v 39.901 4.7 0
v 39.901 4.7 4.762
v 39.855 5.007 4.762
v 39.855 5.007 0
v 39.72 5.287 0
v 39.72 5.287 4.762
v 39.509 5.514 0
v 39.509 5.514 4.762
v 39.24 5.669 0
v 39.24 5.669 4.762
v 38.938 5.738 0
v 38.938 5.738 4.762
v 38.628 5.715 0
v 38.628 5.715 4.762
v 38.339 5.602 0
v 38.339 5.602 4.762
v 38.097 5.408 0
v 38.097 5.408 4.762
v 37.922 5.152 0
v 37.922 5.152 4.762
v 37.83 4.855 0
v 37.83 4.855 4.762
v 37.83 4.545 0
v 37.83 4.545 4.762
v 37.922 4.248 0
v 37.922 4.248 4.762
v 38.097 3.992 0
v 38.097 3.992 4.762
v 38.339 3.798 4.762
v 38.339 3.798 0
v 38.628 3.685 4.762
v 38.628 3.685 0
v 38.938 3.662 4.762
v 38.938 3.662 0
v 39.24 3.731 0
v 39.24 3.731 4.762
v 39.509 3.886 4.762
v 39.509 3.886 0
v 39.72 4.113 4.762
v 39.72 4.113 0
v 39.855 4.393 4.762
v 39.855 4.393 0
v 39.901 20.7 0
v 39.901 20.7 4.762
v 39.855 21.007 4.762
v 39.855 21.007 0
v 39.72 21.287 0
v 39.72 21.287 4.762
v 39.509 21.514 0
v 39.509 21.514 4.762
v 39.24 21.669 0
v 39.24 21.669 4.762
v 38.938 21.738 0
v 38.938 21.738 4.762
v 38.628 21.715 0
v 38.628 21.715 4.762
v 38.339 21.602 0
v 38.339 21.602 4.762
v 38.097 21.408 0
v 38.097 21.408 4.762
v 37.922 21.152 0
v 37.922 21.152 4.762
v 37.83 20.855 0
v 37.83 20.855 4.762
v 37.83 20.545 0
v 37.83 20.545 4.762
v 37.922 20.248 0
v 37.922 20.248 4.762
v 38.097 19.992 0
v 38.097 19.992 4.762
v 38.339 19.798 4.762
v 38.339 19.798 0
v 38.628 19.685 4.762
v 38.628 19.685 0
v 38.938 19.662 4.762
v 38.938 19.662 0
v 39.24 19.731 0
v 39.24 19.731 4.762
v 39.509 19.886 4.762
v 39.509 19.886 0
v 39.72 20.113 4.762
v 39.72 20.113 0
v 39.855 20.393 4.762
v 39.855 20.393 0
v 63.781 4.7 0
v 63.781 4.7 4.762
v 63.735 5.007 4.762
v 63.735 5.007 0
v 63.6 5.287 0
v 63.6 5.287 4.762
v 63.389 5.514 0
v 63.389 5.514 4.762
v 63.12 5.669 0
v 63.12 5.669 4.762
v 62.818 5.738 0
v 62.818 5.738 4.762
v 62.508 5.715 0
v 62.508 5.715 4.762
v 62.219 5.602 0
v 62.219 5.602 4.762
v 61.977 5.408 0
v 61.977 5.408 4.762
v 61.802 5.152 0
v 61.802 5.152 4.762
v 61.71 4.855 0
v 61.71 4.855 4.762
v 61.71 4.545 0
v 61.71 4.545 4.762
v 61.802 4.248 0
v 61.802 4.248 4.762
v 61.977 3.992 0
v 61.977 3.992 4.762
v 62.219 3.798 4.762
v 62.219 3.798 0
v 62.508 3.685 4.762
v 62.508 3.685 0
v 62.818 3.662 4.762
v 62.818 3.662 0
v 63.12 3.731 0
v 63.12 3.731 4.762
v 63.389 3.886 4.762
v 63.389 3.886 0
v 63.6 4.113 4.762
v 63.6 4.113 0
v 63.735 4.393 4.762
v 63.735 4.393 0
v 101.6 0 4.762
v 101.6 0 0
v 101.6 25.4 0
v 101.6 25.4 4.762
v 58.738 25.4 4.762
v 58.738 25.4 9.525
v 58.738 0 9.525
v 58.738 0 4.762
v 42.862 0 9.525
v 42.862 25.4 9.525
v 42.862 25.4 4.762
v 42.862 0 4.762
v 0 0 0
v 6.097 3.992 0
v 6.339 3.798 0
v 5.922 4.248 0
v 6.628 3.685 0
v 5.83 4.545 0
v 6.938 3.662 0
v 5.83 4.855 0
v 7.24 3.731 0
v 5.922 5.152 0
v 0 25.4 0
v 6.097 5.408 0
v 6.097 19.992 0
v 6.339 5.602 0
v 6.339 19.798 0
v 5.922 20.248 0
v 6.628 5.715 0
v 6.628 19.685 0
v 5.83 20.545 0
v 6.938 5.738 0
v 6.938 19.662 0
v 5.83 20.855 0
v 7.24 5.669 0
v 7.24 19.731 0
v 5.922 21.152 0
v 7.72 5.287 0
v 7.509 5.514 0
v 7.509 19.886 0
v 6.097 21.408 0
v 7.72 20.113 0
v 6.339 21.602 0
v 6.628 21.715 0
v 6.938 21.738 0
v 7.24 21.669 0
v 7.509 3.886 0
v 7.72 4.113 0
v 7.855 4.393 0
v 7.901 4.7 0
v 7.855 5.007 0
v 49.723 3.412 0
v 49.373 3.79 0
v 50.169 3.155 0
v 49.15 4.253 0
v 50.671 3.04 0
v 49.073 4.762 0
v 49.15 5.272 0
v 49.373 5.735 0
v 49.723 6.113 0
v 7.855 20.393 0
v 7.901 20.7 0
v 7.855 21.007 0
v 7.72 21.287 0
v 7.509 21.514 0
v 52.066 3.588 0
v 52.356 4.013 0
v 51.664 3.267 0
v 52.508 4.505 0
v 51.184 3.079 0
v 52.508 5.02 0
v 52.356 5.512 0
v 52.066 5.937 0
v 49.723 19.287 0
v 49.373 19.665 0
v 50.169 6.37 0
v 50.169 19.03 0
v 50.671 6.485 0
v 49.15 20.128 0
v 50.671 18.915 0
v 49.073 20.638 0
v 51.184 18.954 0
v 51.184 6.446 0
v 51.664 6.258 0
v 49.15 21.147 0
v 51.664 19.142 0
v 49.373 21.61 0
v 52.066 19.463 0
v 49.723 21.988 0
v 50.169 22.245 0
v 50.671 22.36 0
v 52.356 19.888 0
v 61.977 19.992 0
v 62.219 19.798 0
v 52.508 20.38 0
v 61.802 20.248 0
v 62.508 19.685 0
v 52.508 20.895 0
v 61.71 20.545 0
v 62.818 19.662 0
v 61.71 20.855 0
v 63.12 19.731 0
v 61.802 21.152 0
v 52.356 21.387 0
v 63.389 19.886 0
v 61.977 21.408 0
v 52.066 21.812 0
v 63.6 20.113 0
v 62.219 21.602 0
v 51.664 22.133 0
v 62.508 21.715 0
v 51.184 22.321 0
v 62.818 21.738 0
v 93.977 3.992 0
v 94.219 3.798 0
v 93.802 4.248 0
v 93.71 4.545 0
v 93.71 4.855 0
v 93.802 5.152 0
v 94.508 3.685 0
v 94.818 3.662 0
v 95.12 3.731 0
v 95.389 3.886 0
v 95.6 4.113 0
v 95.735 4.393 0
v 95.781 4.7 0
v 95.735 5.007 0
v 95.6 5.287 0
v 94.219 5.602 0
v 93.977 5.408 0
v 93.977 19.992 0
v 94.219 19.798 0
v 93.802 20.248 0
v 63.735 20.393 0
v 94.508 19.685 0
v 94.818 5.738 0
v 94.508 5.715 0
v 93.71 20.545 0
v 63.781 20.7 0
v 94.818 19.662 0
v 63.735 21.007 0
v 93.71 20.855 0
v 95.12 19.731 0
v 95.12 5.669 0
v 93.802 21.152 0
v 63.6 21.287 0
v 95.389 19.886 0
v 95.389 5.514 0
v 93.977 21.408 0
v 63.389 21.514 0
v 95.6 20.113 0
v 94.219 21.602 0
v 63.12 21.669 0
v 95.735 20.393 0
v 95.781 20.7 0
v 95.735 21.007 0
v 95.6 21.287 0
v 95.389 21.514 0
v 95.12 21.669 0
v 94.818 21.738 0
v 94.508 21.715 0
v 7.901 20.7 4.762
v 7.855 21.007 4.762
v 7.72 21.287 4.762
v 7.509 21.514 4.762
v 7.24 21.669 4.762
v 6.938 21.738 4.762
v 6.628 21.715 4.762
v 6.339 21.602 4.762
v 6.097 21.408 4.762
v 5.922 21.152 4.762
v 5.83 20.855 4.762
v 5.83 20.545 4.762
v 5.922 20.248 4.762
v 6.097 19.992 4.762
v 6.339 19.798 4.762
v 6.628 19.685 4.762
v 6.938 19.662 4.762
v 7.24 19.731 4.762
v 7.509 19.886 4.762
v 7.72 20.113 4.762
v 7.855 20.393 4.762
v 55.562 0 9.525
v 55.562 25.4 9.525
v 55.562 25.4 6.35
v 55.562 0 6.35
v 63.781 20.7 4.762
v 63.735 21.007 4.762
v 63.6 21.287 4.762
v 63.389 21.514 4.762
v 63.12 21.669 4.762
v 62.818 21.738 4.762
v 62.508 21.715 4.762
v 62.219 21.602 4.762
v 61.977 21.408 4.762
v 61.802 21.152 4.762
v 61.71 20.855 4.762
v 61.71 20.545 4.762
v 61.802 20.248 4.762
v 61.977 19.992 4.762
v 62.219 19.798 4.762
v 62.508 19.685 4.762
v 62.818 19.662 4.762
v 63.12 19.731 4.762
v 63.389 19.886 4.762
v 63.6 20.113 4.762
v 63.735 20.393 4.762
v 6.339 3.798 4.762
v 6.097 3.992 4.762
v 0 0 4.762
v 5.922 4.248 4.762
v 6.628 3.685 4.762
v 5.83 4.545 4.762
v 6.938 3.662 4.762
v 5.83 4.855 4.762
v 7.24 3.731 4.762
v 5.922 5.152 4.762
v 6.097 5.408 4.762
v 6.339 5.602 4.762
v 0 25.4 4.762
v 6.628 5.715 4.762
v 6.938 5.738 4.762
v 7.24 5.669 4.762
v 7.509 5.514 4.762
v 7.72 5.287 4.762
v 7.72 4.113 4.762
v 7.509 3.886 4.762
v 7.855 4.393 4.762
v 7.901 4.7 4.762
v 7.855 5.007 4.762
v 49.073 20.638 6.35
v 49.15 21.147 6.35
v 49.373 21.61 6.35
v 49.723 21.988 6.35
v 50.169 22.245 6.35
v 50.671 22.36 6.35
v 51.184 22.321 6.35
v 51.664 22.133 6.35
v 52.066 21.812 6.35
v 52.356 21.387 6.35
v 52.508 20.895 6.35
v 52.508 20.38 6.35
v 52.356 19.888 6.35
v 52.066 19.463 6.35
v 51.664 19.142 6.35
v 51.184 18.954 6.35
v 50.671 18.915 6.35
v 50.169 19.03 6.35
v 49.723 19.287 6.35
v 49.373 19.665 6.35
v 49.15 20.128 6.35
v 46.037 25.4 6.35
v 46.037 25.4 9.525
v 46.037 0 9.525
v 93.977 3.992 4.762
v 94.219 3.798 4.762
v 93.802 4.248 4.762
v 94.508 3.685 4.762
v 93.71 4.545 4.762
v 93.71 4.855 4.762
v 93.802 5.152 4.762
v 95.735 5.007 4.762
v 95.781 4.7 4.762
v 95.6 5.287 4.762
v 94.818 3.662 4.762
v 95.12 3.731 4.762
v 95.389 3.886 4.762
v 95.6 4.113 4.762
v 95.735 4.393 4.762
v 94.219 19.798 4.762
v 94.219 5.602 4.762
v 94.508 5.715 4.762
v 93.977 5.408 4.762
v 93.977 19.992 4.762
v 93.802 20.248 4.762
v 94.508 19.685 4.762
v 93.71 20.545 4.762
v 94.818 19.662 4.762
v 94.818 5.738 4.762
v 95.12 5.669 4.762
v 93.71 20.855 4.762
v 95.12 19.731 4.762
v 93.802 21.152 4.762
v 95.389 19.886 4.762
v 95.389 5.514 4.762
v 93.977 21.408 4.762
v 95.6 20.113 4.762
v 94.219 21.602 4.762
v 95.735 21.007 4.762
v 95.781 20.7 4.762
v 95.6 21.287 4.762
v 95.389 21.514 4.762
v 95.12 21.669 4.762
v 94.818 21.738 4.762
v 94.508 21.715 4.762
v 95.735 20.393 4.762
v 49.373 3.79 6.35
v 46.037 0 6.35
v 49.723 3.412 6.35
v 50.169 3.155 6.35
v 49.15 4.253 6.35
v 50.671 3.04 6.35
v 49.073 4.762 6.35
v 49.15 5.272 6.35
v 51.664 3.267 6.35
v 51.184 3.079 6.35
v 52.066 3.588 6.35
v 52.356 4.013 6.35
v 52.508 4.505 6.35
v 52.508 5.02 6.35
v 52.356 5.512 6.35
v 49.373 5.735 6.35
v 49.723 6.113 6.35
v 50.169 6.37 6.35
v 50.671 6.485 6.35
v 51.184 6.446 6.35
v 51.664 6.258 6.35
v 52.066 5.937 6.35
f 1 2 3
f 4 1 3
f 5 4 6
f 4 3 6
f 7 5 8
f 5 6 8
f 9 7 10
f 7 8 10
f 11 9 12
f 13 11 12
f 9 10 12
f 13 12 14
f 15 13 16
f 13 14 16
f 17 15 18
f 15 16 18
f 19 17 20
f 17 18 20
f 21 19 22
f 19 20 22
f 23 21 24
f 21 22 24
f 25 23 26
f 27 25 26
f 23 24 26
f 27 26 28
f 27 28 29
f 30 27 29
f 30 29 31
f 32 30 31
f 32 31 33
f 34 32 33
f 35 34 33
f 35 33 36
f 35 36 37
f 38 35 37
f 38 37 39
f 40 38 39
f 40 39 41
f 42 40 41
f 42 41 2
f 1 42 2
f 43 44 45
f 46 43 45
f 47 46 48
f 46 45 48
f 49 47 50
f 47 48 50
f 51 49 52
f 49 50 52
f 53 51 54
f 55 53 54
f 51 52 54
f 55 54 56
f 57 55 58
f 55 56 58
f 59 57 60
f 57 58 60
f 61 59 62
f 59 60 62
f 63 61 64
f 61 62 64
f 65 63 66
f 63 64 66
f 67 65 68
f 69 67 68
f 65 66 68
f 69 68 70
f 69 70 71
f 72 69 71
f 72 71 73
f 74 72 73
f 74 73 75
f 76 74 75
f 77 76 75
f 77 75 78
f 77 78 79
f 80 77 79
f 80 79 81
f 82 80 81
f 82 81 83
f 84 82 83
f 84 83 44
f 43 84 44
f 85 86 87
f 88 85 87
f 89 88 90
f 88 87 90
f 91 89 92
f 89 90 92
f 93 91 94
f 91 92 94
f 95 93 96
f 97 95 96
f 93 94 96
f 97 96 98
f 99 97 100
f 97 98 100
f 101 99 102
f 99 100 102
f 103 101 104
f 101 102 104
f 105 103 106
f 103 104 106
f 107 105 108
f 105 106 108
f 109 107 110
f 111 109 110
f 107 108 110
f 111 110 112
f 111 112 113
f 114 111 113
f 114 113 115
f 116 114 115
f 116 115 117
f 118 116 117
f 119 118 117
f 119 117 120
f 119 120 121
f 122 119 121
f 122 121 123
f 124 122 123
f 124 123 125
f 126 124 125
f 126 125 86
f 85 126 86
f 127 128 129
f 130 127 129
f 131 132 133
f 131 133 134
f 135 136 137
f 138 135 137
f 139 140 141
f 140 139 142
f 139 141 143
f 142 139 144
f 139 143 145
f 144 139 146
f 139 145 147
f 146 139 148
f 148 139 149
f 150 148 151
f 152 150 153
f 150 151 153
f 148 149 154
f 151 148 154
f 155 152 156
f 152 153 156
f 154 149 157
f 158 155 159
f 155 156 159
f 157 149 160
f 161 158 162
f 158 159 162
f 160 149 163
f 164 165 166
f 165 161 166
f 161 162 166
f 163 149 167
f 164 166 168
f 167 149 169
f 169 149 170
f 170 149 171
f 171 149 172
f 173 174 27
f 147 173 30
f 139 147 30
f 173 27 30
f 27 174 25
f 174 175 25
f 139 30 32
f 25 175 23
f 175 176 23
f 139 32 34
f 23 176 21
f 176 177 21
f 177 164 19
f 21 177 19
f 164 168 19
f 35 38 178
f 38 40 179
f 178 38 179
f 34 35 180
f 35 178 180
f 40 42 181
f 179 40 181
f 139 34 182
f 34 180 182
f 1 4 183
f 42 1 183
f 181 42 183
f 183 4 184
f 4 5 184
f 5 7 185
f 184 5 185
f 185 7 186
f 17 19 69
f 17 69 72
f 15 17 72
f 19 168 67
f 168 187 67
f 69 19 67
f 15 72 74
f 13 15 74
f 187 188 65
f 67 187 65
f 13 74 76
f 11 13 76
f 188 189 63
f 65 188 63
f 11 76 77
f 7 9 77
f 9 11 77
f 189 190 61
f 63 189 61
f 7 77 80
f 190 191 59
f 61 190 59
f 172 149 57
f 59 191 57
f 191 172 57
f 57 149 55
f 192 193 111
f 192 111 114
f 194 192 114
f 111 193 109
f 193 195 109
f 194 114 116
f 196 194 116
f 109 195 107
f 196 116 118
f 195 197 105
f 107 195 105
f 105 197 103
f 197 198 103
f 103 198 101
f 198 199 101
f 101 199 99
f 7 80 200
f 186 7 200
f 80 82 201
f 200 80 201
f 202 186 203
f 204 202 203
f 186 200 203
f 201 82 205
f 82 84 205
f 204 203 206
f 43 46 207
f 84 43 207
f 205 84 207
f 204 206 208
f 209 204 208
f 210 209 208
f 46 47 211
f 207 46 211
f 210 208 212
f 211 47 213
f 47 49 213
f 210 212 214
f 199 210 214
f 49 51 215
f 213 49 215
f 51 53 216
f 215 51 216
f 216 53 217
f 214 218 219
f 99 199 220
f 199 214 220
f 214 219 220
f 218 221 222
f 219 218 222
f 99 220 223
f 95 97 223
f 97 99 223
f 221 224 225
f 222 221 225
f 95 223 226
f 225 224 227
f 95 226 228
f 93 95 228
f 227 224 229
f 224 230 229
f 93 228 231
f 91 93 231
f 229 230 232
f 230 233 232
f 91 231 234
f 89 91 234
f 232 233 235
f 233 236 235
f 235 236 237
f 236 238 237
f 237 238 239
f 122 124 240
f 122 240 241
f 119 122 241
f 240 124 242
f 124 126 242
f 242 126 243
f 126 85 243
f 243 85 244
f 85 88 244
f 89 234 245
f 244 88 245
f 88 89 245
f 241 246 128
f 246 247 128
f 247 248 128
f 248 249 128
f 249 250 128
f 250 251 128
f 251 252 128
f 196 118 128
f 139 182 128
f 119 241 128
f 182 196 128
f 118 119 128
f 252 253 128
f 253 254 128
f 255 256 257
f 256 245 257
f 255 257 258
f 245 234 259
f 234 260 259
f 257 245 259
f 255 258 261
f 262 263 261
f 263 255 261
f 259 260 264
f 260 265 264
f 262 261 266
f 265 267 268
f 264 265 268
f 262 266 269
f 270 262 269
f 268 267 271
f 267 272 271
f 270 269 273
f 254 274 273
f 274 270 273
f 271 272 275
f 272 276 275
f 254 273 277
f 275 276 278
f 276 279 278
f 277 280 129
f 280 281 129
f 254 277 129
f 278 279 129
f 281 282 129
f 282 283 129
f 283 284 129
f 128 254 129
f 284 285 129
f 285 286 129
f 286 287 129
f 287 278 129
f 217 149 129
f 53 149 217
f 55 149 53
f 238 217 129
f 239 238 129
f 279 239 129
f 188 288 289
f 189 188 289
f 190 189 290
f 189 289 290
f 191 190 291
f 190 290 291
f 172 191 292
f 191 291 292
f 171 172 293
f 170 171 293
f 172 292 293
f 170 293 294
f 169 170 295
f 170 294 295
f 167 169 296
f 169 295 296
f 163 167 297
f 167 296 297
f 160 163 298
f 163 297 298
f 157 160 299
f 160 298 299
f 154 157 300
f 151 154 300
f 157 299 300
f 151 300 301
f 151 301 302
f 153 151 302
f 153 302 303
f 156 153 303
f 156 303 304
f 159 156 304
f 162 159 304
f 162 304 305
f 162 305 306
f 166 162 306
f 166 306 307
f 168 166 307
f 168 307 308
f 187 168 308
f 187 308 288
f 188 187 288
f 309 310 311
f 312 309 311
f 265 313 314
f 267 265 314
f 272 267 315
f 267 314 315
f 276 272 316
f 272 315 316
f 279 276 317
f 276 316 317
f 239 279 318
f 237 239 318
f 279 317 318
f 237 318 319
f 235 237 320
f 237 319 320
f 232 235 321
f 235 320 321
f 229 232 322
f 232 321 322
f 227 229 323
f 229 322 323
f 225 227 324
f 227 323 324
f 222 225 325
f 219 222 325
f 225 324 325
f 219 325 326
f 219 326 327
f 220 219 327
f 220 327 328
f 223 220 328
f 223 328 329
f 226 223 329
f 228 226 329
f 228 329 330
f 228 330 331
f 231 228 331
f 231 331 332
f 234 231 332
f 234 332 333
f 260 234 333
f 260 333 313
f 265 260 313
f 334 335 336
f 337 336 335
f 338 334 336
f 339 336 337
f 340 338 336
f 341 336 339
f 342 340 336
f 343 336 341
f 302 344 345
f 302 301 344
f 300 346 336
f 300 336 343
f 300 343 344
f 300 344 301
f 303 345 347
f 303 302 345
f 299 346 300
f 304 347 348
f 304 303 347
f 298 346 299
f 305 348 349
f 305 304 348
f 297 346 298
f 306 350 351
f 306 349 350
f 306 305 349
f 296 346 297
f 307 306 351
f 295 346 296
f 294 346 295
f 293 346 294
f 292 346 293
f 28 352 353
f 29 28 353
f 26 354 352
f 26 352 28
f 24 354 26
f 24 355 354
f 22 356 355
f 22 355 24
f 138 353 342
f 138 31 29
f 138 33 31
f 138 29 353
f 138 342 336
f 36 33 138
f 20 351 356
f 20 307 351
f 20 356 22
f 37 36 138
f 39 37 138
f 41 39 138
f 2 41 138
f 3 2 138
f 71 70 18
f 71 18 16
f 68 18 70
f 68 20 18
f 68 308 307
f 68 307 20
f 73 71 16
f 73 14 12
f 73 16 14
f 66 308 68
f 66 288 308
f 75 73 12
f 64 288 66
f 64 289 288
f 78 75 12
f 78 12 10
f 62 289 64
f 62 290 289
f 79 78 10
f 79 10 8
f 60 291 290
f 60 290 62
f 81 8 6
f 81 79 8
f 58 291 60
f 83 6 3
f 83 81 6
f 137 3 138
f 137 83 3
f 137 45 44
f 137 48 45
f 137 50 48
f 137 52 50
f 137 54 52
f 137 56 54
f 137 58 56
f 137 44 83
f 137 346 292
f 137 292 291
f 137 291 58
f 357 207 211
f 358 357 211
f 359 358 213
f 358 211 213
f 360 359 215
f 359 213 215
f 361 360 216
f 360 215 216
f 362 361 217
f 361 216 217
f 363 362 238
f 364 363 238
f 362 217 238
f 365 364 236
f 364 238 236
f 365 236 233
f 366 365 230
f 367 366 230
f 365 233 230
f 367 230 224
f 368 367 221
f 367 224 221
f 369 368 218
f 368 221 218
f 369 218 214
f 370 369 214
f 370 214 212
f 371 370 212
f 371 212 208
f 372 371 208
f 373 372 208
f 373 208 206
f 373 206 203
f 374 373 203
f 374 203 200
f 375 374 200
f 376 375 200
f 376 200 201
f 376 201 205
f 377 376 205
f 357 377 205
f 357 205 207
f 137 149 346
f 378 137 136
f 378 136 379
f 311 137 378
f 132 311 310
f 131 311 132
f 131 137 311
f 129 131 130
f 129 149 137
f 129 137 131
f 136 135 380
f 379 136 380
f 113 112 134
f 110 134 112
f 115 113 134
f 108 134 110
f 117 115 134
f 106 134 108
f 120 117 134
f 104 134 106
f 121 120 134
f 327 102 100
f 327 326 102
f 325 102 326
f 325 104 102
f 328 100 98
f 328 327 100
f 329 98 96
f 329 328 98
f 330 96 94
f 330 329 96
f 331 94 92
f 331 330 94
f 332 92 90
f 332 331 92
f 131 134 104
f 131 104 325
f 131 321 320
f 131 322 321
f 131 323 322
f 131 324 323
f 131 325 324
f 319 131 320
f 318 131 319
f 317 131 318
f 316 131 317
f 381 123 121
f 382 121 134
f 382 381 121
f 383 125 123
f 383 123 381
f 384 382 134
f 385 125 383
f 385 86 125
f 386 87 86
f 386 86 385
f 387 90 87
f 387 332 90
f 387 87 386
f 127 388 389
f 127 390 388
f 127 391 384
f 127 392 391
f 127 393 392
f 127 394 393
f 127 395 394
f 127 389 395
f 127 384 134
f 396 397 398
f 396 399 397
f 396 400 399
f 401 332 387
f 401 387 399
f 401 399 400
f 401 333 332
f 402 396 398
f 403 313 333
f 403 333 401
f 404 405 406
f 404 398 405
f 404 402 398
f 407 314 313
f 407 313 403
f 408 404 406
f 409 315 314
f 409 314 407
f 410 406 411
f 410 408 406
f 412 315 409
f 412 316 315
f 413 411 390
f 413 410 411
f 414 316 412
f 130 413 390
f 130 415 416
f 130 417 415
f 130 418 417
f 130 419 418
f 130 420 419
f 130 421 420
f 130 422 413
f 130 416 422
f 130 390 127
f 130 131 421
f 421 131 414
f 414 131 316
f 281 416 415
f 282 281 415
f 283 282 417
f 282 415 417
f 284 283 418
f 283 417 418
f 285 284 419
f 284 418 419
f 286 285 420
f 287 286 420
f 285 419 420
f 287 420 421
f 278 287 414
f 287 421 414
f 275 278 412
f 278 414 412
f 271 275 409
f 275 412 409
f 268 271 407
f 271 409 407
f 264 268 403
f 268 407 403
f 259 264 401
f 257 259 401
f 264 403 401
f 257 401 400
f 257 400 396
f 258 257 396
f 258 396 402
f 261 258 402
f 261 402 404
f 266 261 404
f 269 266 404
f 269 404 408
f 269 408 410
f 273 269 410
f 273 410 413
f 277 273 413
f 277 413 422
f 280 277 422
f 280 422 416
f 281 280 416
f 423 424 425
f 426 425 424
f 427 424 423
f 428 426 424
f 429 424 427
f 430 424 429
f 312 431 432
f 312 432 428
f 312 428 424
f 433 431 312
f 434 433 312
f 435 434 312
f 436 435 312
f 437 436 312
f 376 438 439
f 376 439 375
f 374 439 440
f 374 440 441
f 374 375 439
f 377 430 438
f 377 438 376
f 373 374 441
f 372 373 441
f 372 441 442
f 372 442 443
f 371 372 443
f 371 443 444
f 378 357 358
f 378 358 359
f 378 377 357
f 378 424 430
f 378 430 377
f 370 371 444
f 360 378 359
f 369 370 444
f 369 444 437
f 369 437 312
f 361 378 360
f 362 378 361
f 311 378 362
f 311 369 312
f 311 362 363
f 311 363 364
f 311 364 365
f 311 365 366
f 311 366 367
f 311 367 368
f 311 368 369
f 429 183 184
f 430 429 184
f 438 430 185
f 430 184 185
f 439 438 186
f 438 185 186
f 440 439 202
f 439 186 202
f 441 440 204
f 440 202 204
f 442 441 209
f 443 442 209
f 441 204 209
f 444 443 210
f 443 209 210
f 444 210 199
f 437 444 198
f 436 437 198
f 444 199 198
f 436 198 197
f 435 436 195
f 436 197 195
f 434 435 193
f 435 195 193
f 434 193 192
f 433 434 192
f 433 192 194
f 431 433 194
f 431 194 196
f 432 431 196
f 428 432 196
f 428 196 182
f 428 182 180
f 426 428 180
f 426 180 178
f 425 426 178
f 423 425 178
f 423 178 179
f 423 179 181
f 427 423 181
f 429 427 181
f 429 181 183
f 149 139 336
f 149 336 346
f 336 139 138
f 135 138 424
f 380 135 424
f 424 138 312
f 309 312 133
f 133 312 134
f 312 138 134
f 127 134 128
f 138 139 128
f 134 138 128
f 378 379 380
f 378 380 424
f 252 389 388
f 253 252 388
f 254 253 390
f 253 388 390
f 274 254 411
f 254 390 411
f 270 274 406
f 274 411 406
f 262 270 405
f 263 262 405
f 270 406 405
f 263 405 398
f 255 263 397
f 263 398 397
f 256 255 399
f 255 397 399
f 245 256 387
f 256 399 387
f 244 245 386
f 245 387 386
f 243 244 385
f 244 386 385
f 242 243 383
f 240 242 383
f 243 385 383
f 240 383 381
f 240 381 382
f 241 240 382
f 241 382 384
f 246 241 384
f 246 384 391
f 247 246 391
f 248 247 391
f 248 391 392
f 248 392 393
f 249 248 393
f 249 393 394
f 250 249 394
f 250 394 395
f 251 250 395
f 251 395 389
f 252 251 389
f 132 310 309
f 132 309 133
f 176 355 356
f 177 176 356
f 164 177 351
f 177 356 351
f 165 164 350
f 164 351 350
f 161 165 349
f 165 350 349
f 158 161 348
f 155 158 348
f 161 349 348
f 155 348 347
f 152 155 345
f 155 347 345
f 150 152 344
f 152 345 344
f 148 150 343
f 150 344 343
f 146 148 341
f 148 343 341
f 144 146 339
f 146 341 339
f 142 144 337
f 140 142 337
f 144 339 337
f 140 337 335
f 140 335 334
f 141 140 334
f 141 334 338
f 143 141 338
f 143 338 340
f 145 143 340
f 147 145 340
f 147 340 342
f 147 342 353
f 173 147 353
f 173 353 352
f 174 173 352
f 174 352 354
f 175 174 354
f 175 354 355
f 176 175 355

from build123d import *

# Parameters (mm, degrees)
SKETCH1_W                       = 101.6
SKETCH1_H                       = 25.4
BOSS_EXTRUDE1_DEPTH             = 9.525
SKETCH2_W                       = 9.525
SKETCH2_H                       = 3.175
SKETCH2_W_2                     = 42.8625
SKETCH2_H_2                     = 4.7625
CUT_EXTRUDE1_DEPTH              = 106.159144277
F_8_32_TAPPED_HOLE1_D           = 3.4544
F_45_0_082_DIAMETER_HOLE1_D     = 2.0828
F_45_0_082_DIAMETER_HOLE1_DEPTH = 9.652
F_45_0_082_DIAMETER_HOLE1_TIP   = 0.625736249


with BuildPart() as part:
    # Sketch1 → Boss-Extrude1 (new body)
    with BuildSketch(Plane.XY):
        with Locations((50.8, 12.7)):
            Rectangle(SKETCH1_W, SKETCH1_H)
    extrude(amount=BOSS_EXTRUDE1_DEPTH)

    # Sketch2 → Cut-Extrude1 (cut, through all)
    with BuildSketch(Plane(origin=(0, 25.4, 0), x_dir=(1, 0, 0), z_dir=(0, 1, 0))):
        with Locations((50.8, -7.9375)):
            Rectangle(SKETCH2_W, SKETCH2_H)
        with Locations((21.43125, -7.14375)):
            Rectangle(SKETCH2_W_2, SKETCH2_H_2)
        with Locations((80.16875, -7.14375)):
            Rectangle(SKETCH2_W_2, SKETCH2_H_2)
    extrude(amount=-CUT_EXTRUDE1_DEPTH, mode=Mode.SUBTRACT)

    # #8-32 Tapped Hole1 (through all)
    with Locations(Plane.XY.offset(6.35)):
        with Locations((50.8, 4.7625), (50.8, 20.6375)):
            Hole(F_8_32_TAPPED_HOLE1_D / 2)

    # #45 (0.082) Diameter Hole1
    with Locations(Plane(origin=(0, 0, 0), x_dir=(-1, 0, 0), z_dir=(0, 0, -1))):
        with Locations((-38.86, 20.7), (-6.86, 20.7), (-38.86, 4.7), (-6.86, 4.7), (-62.74, 4.7), (-94.74, 4.7), (-62.74, 20.7), (-94.74, 20.7)):
            Hole(F_45_0_082_DIAMETER_HOLE1_D / 2, depth=F_45_0_082_DIAMETER_HOLE1_DEPTH)
            with Locations((0, 0, -(F_45_0_082_DIAMETER_HOLE1_DEPTH + F_45_0_082_DIAMETER_HOLE1_TIP / 2))):  # 118° drill point
                Cone(0, F_45_0_082_DIAMETER_HOLE1_D / 2, F_45_0_082_DIAMETER_HOLE1_TIP, mode=Mode.SUBTRACT)


solid = part.part
